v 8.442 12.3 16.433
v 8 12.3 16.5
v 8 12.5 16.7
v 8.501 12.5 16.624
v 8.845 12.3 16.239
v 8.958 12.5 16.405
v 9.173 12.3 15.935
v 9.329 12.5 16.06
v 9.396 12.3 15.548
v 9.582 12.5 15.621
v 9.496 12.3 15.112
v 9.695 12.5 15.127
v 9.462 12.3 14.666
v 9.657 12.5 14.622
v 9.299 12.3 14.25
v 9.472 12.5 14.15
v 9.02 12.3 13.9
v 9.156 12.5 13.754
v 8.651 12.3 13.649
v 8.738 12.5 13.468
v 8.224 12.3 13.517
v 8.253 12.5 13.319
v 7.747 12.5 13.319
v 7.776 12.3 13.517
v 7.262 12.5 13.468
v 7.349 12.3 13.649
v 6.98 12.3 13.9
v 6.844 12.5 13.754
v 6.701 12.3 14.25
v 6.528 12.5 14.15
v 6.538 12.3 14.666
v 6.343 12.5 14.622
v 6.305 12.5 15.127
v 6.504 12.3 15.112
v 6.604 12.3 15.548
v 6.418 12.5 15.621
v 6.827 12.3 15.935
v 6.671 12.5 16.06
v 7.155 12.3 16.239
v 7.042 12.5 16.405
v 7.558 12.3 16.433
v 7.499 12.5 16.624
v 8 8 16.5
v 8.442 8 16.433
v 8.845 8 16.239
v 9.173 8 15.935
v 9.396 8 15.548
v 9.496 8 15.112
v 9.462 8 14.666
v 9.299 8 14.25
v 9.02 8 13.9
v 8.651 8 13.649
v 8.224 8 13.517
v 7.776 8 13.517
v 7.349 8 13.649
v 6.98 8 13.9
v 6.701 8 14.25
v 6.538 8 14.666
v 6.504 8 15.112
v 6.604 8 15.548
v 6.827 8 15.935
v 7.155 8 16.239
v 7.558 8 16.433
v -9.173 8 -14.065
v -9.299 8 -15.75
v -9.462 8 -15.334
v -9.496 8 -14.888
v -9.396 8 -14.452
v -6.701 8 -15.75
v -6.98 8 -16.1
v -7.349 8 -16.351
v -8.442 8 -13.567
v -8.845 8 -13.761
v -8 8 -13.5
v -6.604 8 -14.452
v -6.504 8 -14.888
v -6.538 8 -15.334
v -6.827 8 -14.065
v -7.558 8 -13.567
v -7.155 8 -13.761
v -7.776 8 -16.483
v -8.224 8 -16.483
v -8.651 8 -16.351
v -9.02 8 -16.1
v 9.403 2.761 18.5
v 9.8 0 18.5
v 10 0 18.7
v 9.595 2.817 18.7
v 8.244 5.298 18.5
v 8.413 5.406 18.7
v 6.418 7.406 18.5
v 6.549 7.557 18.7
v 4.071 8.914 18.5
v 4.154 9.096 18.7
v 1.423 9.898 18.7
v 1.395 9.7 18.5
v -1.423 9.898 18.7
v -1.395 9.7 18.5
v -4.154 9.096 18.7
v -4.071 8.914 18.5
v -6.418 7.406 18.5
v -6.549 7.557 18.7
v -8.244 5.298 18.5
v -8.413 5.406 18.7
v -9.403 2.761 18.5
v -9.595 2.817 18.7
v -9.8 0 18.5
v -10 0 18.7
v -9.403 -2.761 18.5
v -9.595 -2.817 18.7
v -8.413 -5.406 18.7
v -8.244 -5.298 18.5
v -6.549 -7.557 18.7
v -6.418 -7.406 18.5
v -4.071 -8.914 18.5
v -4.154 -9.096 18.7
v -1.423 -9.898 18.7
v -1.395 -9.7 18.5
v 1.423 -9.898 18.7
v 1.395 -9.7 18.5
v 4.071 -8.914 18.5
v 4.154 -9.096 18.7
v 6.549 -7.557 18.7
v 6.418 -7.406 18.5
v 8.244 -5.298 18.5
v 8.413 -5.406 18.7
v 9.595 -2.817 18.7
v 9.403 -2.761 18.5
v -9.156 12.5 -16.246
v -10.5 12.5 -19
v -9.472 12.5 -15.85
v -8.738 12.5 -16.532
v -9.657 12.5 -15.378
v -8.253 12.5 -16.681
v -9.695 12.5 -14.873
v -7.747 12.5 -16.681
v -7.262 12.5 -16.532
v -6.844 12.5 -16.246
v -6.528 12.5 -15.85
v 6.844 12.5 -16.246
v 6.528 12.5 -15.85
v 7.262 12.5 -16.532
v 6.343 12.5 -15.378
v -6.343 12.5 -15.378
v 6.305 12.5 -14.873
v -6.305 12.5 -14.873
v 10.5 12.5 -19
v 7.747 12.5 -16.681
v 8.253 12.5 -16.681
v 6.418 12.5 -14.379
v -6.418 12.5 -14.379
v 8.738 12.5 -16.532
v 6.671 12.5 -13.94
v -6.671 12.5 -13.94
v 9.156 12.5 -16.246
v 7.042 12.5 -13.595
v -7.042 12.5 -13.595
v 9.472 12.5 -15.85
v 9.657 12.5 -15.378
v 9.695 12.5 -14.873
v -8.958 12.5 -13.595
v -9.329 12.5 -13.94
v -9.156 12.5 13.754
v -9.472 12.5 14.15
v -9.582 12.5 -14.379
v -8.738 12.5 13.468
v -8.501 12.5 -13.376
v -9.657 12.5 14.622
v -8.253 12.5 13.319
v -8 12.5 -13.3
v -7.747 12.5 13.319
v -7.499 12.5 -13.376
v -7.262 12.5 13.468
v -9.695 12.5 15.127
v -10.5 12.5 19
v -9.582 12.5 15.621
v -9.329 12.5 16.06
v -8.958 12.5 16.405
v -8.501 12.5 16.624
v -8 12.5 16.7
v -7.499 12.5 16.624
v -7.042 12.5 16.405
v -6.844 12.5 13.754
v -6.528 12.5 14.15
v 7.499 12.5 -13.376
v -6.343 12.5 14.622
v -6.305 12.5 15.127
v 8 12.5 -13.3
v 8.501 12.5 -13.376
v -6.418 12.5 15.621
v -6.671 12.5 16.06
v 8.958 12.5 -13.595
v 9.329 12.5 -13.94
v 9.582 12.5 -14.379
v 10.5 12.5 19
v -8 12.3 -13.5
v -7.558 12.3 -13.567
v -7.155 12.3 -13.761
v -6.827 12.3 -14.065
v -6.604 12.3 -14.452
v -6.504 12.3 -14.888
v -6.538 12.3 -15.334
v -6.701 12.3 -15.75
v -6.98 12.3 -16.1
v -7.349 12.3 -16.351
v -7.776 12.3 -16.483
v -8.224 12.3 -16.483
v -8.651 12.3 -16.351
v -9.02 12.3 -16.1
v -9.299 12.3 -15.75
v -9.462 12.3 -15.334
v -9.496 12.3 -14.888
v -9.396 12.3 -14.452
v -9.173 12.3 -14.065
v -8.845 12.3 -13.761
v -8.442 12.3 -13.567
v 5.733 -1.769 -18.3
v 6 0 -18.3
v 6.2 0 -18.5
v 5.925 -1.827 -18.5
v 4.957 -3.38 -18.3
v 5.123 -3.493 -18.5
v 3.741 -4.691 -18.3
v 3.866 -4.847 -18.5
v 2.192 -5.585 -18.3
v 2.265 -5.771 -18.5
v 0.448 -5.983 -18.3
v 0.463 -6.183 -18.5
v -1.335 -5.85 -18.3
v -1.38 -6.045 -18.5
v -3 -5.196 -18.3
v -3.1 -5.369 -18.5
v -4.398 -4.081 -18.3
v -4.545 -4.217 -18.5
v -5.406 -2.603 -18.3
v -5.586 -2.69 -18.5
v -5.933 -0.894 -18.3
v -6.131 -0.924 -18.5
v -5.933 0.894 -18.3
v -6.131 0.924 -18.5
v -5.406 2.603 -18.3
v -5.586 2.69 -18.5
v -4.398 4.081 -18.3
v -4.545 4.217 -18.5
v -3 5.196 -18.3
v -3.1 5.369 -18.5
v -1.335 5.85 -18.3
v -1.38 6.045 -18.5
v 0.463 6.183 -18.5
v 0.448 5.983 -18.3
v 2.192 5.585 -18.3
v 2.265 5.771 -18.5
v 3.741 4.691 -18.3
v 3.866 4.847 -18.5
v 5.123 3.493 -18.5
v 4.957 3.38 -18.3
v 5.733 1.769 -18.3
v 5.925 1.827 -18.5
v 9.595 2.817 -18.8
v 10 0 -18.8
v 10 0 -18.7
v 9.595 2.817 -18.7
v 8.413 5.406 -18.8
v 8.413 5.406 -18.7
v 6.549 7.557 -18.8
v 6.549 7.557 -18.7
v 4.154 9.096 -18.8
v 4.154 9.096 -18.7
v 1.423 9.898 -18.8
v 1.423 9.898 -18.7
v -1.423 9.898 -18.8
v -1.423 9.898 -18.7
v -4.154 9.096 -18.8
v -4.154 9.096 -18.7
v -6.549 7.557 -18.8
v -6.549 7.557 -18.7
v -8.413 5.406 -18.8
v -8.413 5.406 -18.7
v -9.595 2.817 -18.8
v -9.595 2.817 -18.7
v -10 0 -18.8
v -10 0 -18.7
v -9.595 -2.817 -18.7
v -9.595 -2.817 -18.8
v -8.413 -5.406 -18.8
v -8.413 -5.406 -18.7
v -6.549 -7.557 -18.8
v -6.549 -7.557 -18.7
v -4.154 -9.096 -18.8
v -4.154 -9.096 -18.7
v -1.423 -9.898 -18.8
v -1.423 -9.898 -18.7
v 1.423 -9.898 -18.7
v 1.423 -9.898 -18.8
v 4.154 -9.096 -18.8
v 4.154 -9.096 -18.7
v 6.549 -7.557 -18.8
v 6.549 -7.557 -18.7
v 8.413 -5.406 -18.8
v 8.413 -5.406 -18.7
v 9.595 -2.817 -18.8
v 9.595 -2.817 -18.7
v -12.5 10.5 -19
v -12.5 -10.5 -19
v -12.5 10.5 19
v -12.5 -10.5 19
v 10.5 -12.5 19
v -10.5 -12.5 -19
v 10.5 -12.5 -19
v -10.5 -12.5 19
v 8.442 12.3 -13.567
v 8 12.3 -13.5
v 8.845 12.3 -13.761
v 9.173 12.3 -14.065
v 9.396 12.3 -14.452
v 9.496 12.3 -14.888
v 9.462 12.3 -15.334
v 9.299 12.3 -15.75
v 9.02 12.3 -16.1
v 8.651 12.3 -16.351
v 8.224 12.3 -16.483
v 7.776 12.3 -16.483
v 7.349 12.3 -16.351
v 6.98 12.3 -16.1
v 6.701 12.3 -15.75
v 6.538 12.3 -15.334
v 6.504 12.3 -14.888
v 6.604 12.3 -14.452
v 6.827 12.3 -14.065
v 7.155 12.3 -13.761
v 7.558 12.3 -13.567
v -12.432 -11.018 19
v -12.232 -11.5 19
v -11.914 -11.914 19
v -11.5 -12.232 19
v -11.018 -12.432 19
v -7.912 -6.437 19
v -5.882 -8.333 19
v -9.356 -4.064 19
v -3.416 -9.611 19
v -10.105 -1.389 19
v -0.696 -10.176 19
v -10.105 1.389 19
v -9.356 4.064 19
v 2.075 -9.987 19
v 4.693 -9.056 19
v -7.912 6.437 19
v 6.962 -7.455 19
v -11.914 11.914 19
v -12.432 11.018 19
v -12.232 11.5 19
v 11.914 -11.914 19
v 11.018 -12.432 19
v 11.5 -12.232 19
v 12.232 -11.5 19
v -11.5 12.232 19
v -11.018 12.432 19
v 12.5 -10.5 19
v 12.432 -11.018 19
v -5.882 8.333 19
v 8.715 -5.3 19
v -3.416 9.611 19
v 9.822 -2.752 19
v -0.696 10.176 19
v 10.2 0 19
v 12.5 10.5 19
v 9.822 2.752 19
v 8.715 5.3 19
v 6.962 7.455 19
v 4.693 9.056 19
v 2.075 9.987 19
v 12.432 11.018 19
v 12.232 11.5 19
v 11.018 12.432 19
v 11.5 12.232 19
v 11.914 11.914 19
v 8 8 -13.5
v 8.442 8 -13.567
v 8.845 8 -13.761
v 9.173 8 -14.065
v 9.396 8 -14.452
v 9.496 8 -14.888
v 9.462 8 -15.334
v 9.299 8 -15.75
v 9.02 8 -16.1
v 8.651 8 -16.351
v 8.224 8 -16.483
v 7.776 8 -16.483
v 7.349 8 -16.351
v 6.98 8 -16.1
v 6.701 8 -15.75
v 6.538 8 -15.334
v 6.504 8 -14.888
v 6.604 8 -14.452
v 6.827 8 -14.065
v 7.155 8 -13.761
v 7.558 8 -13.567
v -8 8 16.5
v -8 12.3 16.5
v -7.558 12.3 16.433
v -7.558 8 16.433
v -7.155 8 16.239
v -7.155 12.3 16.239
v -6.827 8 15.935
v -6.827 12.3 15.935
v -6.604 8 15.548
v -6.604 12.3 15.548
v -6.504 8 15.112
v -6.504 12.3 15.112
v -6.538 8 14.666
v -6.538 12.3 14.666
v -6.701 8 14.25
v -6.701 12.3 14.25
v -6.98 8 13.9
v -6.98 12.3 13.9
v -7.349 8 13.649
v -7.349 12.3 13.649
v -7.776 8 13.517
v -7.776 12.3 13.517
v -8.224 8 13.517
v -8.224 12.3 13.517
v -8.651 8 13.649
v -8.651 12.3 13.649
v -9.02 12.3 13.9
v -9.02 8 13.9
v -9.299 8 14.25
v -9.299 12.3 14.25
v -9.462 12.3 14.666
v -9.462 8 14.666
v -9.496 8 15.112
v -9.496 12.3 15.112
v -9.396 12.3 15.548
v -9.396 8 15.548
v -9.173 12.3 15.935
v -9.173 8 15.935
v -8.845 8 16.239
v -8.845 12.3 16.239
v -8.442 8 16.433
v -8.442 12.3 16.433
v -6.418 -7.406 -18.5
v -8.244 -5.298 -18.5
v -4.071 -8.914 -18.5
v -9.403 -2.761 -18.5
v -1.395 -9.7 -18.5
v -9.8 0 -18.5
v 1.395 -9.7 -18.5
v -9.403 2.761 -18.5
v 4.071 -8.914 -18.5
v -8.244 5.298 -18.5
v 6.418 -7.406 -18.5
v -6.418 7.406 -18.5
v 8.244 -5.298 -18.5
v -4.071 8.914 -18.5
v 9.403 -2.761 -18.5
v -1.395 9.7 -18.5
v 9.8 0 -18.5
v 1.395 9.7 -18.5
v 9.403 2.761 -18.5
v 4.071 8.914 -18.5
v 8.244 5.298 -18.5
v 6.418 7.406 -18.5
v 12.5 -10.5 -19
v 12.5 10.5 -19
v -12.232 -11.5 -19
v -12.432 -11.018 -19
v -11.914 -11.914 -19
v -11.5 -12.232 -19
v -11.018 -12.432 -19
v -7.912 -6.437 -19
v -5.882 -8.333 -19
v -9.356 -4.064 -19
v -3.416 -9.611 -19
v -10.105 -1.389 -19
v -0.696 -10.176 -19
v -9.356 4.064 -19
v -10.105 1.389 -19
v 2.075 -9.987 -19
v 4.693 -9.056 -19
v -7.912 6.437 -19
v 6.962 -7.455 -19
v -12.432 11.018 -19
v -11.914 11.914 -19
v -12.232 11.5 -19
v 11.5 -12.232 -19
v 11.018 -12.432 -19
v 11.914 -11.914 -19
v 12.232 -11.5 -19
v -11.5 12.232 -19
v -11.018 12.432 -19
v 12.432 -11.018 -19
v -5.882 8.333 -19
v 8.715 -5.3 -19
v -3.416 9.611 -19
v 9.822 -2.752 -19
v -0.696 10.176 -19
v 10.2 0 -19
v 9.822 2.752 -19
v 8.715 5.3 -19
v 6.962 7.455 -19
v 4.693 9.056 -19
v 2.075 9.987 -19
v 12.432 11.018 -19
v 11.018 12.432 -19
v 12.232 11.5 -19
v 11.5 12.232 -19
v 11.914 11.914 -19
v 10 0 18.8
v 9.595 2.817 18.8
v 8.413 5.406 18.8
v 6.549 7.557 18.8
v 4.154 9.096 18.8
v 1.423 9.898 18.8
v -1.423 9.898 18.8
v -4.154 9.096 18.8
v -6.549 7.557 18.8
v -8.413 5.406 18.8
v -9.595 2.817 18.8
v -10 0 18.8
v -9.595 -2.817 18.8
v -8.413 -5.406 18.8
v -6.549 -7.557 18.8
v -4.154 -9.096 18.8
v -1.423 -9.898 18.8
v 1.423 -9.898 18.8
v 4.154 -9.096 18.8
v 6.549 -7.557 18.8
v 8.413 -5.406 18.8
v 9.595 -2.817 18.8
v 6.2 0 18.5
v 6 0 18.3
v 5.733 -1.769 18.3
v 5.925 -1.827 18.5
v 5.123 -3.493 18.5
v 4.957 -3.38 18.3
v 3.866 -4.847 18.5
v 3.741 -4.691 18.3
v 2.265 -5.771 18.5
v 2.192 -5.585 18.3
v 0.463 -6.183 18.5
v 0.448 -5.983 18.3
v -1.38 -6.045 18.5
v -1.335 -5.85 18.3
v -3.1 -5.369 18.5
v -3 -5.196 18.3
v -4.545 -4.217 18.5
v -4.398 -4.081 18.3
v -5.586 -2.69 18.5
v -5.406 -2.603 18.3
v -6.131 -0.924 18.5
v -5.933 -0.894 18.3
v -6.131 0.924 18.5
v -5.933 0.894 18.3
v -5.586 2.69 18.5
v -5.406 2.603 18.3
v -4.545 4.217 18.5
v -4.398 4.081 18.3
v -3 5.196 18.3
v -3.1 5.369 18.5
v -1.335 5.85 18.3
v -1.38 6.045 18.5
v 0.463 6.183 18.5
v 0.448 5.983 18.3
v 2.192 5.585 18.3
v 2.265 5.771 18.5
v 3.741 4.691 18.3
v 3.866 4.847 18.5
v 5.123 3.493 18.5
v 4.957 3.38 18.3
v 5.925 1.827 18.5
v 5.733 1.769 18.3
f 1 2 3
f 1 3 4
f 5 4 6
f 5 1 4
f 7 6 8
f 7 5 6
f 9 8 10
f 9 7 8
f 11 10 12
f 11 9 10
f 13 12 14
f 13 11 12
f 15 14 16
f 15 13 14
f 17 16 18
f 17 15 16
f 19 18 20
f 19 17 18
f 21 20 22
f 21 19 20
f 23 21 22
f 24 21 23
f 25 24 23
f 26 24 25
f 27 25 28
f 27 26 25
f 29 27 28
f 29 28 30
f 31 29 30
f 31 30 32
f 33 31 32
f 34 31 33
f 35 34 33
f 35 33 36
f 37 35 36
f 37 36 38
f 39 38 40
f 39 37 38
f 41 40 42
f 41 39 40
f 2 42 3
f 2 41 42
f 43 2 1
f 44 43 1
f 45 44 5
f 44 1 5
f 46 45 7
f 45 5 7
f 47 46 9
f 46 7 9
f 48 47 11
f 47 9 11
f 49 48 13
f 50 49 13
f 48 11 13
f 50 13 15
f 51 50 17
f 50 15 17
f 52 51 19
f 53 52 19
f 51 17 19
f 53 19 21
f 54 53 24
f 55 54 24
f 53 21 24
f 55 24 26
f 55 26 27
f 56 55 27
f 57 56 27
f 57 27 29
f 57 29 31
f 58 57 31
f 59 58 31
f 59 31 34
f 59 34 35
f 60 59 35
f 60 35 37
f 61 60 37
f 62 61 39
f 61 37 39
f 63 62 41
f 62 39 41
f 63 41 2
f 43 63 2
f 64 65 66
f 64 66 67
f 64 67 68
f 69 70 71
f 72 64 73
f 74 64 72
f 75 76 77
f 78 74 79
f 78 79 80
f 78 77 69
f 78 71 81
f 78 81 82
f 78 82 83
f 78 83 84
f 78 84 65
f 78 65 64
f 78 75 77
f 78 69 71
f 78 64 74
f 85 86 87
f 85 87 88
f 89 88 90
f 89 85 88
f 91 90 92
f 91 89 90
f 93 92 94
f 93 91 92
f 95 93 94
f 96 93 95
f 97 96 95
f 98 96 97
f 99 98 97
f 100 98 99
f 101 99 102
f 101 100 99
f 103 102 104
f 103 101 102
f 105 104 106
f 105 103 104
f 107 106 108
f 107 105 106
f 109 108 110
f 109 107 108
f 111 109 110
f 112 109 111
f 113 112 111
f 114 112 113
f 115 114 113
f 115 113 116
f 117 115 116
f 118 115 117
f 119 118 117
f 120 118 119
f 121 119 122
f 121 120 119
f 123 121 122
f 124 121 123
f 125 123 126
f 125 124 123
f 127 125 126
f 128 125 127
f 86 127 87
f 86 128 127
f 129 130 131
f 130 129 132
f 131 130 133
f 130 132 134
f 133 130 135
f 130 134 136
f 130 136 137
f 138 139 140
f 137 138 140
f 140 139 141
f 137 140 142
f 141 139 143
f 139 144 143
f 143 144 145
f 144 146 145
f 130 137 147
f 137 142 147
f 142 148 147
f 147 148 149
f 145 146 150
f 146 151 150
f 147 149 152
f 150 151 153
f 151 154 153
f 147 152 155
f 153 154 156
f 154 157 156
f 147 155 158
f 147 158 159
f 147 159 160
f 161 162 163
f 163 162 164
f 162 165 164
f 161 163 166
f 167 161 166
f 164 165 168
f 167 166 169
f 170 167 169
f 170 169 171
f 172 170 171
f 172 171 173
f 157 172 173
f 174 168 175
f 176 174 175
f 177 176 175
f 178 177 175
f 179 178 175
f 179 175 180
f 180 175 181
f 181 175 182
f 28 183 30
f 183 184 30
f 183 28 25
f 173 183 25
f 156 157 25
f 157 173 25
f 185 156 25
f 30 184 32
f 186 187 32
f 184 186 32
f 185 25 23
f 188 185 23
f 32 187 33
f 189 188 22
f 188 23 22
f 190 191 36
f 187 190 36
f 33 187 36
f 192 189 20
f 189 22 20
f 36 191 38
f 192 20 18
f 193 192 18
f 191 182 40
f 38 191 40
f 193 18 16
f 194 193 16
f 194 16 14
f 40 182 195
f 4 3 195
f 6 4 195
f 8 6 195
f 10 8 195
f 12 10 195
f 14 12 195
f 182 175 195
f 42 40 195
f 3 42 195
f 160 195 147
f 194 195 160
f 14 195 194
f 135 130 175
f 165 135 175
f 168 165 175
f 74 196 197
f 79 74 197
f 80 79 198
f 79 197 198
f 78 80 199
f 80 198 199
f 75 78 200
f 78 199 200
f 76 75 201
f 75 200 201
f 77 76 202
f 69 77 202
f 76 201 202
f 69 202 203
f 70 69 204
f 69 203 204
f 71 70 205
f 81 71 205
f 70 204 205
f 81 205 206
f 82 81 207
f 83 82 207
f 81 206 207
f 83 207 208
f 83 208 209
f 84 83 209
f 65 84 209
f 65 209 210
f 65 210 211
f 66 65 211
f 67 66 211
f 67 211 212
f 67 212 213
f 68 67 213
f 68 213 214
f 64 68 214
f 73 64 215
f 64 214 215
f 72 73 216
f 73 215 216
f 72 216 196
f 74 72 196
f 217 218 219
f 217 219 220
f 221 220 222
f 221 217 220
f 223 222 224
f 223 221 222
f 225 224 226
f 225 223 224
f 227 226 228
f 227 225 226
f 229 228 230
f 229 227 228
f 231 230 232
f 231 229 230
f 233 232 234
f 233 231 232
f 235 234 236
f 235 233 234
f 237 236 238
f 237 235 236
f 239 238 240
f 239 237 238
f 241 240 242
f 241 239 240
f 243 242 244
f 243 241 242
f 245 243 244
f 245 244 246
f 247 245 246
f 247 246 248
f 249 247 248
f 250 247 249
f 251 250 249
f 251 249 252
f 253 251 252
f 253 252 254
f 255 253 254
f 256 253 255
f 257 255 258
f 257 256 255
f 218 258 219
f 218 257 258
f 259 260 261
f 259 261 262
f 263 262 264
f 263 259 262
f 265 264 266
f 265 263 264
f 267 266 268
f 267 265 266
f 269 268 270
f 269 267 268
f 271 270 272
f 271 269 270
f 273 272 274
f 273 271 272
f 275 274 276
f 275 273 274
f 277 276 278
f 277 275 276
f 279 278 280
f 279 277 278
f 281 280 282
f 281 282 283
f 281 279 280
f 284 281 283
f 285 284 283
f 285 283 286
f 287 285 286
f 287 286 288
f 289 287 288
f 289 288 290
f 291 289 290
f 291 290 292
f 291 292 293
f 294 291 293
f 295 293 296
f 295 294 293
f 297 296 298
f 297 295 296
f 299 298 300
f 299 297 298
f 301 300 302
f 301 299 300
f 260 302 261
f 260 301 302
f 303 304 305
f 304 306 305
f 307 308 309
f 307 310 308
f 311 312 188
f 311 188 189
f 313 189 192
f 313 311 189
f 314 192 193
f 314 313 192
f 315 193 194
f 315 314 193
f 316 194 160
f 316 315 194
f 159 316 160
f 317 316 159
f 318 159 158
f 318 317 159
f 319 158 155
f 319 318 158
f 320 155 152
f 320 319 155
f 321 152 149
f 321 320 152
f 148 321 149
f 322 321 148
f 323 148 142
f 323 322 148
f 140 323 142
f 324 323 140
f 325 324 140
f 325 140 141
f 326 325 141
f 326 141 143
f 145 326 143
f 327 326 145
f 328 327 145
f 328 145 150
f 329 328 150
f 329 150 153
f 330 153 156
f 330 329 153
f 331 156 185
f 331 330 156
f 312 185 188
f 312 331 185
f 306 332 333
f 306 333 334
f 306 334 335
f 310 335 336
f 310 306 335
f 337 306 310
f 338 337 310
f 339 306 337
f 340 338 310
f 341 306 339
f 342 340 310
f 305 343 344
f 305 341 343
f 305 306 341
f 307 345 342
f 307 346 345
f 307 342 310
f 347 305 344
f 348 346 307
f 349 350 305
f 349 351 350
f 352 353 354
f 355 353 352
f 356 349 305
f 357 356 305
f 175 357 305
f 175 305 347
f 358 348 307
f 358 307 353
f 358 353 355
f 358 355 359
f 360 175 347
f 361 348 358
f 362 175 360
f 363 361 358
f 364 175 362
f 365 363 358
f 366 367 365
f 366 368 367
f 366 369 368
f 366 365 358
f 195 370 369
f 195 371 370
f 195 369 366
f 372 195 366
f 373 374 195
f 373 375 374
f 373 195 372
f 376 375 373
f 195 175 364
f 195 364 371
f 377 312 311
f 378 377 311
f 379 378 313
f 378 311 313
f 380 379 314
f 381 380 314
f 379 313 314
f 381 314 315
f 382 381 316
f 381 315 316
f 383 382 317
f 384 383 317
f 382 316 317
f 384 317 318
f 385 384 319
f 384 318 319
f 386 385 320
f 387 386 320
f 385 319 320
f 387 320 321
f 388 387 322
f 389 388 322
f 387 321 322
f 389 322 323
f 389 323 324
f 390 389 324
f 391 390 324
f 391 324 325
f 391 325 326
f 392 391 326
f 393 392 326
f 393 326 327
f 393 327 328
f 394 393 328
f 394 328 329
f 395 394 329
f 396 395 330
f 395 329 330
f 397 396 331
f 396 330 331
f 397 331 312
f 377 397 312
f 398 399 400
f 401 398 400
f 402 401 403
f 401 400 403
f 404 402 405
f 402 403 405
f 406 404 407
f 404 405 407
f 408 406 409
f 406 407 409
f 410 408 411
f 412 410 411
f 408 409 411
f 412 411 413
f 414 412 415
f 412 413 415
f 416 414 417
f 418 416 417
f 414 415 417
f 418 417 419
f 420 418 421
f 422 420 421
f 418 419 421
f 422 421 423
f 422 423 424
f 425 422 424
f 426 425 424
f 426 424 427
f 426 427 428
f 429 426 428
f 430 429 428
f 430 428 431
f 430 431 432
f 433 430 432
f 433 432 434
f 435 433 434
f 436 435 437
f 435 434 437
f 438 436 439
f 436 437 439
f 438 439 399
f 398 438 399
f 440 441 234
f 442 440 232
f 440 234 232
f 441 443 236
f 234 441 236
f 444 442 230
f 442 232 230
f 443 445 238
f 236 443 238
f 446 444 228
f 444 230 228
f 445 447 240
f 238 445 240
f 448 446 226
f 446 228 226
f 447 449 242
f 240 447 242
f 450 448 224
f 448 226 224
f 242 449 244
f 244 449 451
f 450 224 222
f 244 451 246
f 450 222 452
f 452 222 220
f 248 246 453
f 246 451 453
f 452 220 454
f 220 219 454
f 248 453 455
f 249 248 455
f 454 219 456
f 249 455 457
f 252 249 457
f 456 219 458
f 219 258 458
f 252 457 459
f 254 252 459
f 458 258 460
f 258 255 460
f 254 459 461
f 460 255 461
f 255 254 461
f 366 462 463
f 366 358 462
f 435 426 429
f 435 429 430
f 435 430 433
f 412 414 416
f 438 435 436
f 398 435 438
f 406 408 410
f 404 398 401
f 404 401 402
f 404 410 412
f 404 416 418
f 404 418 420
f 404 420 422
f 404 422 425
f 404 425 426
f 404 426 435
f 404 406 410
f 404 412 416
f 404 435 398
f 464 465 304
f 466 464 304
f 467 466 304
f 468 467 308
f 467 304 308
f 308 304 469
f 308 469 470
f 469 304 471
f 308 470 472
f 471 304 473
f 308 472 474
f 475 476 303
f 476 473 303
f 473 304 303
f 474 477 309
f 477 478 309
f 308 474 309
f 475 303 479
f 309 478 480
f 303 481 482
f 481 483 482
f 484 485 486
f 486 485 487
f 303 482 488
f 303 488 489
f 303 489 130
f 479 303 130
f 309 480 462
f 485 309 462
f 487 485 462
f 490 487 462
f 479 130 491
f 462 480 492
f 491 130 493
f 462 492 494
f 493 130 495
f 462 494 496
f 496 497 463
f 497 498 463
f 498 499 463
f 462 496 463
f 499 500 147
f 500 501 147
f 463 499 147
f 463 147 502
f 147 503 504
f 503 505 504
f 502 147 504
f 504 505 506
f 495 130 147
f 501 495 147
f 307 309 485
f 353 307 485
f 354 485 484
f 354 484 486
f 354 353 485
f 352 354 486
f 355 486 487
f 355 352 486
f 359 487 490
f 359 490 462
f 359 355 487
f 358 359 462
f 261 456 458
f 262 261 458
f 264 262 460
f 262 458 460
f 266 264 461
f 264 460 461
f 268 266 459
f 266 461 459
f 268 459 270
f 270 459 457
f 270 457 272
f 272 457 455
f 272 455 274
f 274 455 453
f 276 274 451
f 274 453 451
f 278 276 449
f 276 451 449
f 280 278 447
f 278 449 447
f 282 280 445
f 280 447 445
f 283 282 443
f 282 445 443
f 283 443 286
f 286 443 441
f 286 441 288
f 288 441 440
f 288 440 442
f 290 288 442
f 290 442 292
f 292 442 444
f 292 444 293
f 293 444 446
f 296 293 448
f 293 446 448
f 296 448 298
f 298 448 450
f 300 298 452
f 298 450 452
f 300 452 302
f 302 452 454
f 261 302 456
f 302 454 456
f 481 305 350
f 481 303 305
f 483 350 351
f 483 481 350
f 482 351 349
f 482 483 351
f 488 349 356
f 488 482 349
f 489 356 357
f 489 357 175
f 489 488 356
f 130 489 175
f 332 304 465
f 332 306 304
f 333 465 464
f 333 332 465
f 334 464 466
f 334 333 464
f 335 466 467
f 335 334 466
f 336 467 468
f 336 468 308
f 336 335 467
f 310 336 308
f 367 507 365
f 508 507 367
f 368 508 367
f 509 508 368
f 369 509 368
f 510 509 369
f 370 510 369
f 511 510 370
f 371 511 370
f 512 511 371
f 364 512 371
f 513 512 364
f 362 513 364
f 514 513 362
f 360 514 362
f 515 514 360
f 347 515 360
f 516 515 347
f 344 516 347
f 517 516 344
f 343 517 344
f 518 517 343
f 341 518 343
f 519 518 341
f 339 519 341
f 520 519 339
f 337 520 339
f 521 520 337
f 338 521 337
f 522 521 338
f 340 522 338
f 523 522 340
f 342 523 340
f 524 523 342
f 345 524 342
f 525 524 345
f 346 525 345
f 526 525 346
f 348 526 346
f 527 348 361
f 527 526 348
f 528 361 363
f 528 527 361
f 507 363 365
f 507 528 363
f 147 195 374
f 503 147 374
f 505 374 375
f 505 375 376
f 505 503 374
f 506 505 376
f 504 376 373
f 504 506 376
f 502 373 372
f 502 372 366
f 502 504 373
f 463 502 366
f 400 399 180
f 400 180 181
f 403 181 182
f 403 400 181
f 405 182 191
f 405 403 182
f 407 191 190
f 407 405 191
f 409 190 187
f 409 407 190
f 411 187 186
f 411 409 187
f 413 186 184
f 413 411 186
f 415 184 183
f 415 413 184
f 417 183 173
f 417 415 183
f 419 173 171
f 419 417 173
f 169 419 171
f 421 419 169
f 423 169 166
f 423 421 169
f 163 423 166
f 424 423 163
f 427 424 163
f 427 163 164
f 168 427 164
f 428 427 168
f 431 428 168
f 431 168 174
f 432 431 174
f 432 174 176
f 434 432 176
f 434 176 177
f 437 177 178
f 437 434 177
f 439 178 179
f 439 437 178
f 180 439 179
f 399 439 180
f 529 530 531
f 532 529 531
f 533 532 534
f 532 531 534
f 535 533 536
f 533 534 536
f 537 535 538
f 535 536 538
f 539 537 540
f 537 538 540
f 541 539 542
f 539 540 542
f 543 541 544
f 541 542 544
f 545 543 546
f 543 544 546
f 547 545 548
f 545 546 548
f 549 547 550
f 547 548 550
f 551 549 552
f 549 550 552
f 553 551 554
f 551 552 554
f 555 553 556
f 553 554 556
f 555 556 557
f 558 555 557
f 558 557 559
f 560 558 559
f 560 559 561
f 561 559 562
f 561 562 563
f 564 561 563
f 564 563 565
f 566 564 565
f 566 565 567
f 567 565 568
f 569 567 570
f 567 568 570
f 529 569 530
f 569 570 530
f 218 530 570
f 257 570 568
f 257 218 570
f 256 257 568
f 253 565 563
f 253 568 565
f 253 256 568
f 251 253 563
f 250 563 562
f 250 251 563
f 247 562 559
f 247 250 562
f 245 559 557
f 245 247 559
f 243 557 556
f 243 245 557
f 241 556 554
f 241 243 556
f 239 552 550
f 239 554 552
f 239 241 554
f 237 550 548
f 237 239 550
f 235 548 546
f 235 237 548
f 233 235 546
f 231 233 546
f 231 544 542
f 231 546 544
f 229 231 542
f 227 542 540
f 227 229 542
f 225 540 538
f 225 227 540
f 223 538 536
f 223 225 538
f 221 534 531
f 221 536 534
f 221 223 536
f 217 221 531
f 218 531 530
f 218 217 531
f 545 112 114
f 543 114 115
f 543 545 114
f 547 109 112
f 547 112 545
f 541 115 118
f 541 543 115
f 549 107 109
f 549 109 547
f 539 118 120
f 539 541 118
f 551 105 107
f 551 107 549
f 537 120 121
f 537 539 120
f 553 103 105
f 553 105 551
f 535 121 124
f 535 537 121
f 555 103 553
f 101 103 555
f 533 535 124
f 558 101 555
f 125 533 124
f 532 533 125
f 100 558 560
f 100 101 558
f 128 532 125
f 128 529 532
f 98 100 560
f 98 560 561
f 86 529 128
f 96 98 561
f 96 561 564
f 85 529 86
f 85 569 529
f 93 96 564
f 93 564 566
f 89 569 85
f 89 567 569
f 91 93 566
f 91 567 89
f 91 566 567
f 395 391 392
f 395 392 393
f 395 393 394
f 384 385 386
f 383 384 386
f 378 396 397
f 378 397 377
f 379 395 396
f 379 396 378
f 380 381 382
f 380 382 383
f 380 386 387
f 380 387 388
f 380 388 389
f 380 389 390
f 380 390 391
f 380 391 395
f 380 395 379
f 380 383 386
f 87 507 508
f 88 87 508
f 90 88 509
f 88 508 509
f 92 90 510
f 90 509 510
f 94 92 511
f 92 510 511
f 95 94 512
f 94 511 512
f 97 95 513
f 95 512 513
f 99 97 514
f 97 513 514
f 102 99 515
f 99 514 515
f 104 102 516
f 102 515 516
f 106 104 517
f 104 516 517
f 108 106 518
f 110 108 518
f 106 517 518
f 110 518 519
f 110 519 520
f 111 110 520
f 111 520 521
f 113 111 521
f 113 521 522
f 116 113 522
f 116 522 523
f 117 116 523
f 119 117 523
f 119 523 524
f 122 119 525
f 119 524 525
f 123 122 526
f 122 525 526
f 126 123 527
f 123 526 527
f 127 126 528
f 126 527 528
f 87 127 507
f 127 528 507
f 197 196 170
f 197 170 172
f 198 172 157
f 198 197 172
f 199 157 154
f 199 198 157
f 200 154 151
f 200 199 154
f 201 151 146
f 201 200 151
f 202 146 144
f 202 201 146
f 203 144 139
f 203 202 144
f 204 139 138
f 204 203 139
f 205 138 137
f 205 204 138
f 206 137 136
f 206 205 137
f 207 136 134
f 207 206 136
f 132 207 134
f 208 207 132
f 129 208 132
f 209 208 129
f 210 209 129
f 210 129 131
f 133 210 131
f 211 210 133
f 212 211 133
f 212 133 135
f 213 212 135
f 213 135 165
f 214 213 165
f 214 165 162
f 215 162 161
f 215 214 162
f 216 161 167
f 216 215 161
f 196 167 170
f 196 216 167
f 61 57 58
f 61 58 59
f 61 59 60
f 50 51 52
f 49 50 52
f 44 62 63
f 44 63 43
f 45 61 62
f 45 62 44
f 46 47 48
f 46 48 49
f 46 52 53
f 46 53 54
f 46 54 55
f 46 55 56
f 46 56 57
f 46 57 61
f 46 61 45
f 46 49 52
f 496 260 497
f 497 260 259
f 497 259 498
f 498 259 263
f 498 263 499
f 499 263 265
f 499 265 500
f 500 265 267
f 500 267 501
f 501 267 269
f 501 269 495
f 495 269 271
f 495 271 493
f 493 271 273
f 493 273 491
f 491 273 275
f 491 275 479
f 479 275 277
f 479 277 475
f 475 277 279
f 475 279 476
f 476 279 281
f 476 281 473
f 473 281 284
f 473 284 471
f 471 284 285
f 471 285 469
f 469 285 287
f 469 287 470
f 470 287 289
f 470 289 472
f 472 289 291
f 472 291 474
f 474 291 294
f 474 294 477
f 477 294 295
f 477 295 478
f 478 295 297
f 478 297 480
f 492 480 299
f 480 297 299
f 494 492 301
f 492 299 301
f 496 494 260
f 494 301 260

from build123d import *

# Parameters (mm, degrees)
SKETCH1_W          = 25
SKETCH1_H          = 25
SKETCH1_R          = 6
BASE_EXTRUDE_DEPTH = 19
SKETCH2_R          = 10
FRONTDETAIL_DEPTH  = 0.5
FILLET1_R          = 2
SKETCH3_R          = 1.5
MOUNTS_DEPTH       = 4.5
CHAMFER1_SIZE      = 0.2


with BuildPart() as part:
    # Sketch1 → Base-Extrude (new, symmetric)
    with BuildSketch(Plane.XY):
        Rectangle(SKETCH1_W, SKETCH1_H)
        Circle(SKETCH1_R, mode=Mode.SUBTRACT)
    extrude(amount=BASE_EXTRUDE_DEPTH, both=True)

    # Sketch2 → FrontDetail (cut)
    with BuildSketch(Plane.XY.offset(19)):
        Circle(SKETCH2_R)
    frontdetail = extrude(amount=-FRONTDETAIL_DEPTH, mode=Mode.SUBTRACT)

    # Mirror1: FrontDetail across plane
    add(frontdetail.mirror(Plane.XY), mode=Mode.SUBTRACT)

    # Fillet1
    fillet1_edges = [part.edges().sort_by_distance(p)[0] for p in [
        (-12.5, 12.5, 0),
        (12.5, 12.5, 0),
        (12.5, -12.5, 0),
        (-12.5, -12.5, 0),
    ]]
    fillet(fillet1_edges, radius=FILLET1_R)

    # Sketch3 → Mounts (cut)
    with BuildSketch(Plane(origin=(0, 12.5, 0), x_dir=(-1, 0, 0), z_dir=(0, 1, 0))):
        with Locations(Location((-8, 15, 0), (0, 0, 90))):
            Circle(SKETCH3_R)
        with Locations(Location((8, 15, 0), (0, 0, 90))):
            Circle(SKETCH3_R)
        with Locations(Location((-8, -15, 0), (0, 0, 90))):
            Circle(SKETCH3_R)
        with Locations(Location((8, -15, 0), (0, 0, 90))):
            Circle(SKETCH3_R)
    extrude(amount=-MOUNTS_DEPTH, mode=Mode.SUBTRACT)

    # Chamfer1
    chamfer1_edges = [part.edges().sort_by_distance(p)[0] for p in [
        (-10, 0, 18.5),
        (-6, 0, 18.5),
        (-10, 0, 19),
        (-10, 0, -19),
        (-6, 0, -18.5),
        (-10, 0, -18.5),
        (8, 12.5, 13.5),
        (-8, 12.5, 13.5),
        (8, 12.5, -16.5),
        (-8, 12.5, -16.5),
    ]]
    chamfer(chamfer1_edges, length=CHAMFER1_SIZE)


solid = part.part
